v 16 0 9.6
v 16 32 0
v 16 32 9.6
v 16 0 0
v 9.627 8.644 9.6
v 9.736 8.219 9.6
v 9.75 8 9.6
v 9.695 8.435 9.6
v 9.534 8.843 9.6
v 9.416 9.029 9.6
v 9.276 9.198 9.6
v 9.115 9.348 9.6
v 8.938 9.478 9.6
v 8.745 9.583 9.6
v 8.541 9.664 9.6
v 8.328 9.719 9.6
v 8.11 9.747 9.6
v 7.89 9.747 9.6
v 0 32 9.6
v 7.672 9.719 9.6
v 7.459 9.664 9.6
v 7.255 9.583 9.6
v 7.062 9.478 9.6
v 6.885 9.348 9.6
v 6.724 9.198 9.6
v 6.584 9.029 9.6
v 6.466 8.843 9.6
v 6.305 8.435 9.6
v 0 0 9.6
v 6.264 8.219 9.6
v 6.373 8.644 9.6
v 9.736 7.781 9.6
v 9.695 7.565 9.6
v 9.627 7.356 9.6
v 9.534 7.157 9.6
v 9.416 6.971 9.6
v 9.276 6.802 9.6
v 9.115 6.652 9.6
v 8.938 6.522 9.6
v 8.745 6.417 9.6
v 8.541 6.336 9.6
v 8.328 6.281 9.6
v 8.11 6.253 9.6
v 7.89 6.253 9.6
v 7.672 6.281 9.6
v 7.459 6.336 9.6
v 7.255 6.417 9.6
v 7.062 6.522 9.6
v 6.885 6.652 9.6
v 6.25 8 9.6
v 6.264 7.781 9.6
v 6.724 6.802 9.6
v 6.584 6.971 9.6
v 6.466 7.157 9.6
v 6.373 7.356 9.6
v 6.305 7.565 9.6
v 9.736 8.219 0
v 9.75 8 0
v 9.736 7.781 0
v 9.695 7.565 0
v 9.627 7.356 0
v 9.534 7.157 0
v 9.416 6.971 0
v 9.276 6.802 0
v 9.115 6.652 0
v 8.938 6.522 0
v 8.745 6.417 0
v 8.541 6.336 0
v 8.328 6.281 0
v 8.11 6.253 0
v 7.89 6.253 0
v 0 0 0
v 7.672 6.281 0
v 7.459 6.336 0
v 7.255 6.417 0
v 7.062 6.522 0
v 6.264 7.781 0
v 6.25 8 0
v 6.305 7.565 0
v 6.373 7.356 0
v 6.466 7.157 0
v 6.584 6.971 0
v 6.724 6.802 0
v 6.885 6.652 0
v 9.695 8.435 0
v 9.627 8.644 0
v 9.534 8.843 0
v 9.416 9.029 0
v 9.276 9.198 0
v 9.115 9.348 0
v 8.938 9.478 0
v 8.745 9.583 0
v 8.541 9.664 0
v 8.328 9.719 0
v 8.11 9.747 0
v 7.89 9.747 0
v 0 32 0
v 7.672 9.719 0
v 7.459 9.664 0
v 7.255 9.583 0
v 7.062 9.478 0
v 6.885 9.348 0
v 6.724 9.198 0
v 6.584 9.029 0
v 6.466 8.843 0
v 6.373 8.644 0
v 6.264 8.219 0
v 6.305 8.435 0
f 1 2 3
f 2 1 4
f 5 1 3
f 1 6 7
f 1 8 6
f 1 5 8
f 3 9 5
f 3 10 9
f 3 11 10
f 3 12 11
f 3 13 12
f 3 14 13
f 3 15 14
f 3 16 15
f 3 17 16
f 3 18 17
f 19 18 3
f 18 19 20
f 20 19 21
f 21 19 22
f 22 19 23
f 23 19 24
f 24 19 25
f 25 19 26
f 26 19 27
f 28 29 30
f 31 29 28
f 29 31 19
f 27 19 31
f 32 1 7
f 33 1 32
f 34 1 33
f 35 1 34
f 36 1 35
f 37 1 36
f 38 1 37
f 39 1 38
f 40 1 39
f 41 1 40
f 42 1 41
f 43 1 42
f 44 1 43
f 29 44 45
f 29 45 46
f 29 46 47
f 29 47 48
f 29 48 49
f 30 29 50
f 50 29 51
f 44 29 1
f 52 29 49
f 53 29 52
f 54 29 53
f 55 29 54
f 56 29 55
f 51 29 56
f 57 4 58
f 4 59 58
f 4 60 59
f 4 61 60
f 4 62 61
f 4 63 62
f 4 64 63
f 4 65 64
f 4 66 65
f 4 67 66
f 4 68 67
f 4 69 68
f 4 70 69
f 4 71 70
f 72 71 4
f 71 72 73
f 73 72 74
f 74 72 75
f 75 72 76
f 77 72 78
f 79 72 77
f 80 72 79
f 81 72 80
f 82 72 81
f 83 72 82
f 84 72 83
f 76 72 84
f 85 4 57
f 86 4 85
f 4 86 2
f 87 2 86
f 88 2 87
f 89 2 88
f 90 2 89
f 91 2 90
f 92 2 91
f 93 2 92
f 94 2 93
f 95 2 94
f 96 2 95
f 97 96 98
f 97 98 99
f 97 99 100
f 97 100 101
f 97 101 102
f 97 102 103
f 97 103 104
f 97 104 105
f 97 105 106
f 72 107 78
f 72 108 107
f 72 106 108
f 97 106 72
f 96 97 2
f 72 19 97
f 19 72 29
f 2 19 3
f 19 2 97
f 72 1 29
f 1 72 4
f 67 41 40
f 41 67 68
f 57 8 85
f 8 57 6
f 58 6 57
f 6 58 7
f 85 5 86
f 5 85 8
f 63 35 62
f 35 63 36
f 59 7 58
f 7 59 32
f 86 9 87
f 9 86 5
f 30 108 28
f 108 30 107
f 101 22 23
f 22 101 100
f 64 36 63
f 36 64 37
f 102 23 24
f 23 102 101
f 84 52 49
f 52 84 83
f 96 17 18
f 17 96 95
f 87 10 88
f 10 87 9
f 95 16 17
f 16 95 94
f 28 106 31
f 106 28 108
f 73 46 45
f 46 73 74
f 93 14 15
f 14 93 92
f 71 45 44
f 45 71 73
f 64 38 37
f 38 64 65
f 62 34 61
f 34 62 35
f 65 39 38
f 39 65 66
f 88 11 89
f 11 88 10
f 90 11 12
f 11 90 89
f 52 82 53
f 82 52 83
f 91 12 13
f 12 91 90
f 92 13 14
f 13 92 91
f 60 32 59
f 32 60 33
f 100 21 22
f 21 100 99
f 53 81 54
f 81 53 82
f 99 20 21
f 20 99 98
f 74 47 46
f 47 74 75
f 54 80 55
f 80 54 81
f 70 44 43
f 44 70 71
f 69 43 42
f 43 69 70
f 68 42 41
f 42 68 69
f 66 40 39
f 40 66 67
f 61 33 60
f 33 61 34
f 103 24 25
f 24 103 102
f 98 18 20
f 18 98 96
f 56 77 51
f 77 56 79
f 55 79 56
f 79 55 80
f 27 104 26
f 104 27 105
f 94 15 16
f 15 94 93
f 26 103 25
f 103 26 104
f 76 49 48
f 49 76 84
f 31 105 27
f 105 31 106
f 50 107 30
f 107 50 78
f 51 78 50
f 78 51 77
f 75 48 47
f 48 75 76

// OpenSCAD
// Paramètres
brique_largeur = 2;
brique_longueur = 4;
diametre_vis = 3.5;

// Module pour une brique de base
module brique() {
  cube([brique_largeur * 8, brique_longueur * 8, 9.6]);
  // ... Ajout de la logique pour les tenons ...
}

// Module pour le trou de vis
module trou_de_vis() {
  cylinder(d=diametre_vis, h=15, $fn=50); // $fn augmente la qualité du cercle
}

// Création de la pièce finale
difference() {
  brique();
  translate([8, 8, -1])
    trou_de_vis();
}
